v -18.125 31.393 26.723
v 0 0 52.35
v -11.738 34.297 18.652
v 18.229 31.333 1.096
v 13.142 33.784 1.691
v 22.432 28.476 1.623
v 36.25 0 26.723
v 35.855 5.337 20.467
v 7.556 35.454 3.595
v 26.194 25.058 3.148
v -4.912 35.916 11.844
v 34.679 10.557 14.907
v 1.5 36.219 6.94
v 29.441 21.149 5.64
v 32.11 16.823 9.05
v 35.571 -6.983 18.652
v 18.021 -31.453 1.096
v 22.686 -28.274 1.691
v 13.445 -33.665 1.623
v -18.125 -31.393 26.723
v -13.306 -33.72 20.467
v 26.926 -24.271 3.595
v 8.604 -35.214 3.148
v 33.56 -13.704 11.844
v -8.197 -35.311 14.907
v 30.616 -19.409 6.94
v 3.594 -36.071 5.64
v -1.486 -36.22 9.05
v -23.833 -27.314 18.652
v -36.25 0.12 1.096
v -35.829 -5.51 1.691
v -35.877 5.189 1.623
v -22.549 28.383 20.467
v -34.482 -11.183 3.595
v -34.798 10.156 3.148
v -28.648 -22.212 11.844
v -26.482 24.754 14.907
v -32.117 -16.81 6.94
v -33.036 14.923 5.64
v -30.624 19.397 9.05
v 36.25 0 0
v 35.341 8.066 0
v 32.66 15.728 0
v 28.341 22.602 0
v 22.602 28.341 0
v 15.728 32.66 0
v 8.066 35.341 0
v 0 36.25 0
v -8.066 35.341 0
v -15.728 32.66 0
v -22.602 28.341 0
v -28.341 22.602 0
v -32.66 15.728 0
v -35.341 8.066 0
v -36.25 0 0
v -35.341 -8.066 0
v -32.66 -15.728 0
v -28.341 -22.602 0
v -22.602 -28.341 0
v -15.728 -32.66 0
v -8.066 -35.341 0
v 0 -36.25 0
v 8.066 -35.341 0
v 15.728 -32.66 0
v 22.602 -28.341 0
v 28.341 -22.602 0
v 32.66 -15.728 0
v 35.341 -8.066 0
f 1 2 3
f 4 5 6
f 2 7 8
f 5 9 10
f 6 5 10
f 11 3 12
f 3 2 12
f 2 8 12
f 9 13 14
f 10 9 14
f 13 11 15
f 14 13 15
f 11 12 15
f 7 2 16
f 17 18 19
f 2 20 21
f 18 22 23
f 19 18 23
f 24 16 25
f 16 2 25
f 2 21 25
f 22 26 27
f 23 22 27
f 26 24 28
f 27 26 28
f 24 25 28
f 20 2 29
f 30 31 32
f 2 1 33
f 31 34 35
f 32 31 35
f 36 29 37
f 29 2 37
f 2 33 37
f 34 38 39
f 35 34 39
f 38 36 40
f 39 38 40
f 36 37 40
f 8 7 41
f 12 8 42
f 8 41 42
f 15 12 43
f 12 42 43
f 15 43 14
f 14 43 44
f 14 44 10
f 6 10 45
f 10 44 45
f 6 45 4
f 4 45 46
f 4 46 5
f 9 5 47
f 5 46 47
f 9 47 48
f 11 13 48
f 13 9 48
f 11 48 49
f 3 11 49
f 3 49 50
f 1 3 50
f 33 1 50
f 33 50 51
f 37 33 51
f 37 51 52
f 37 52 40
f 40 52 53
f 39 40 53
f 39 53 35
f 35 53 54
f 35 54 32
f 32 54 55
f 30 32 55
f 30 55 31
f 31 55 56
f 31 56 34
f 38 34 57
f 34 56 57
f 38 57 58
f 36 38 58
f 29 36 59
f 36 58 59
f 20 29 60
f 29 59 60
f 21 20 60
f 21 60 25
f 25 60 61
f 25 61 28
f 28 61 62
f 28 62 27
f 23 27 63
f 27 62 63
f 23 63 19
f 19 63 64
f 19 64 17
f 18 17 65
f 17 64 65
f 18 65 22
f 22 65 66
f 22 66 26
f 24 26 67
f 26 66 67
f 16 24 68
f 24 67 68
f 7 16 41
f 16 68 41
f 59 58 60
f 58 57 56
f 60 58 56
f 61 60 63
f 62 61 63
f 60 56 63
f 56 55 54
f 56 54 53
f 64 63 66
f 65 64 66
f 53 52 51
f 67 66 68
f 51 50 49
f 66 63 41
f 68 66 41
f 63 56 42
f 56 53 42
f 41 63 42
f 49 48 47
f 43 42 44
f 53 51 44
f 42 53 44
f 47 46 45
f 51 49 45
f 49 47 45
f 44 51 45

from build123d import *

# Parameters (mm, degrees)
SKETCH_1_R          = 36.25
EXTRUDE_1_DEPTH     = 52.35
CUT_EXTRUDE_1_DEPTH = 39.5
CUT_EXTRUDE_2_DEPTH = 62
CUT_EXTRUDE_3_DEPTH = 53.5


with BuildPart() as part:
    # 草图1 → 凸台-拉伸1 (new body)
    with BuildSketch(Plane.XY):
        Circle(SKETCH_1_R)
    extrude(amount=EXTRUDE_1_DEPTH)

    # 草图2 → 切除-拉伸1 (cut, symmetric)
    with BuildSketch(Plane(origin=(0, 0, 0), x_dir=(1, 0, 0), z_dir=(0, 1, 0))):
        Polygon((0, -52.35), (-40.690324156, 5.182856926), (-40.690324156, -56.656954578), (0, -56.656954578), align=None)
    extrude(amount=CUT_EXTRUDE_1_DEPTH, both=True, mode=Mode.SUBTRACT)

    # 草图4 → 切除-拉伸2 (cut, symmetric)
    with BuildSketch(Plane(origin=(0, 0, 0), x_dir=(0.5, 0.866025404, 0), z_dir=(0.866025404, -0.5, 0))):
        Polygon((0, 52.35), (102.797241837, -92.997060504), (102.797241837, 79.089205692), (0, 79.089205692), align=None)
    extrude(amount=CUT_EXTRUDE_2_DEPTH, both=True, mode=Mode.SUBTRACT)

    # 草图5 → 切除-拉伸3 (cut, symmetric)
    with BuildSketch(Plane(origin=(0, 0, 0), x_dir=(0.5, -0.866025404, 0), z_dir=(-0.866025404, -0.5, 0))):
        Polygon((0, 52.35), (47.788184694, -15.218662816), (47.788184694, 62.081252558), (2.684670532, 62.081252558), align=None)
    extrude(amount=CUT_EXTRUDE_3_DEPTH, both=True, mode=Mode.SUBTRACT)


solid = part.part
